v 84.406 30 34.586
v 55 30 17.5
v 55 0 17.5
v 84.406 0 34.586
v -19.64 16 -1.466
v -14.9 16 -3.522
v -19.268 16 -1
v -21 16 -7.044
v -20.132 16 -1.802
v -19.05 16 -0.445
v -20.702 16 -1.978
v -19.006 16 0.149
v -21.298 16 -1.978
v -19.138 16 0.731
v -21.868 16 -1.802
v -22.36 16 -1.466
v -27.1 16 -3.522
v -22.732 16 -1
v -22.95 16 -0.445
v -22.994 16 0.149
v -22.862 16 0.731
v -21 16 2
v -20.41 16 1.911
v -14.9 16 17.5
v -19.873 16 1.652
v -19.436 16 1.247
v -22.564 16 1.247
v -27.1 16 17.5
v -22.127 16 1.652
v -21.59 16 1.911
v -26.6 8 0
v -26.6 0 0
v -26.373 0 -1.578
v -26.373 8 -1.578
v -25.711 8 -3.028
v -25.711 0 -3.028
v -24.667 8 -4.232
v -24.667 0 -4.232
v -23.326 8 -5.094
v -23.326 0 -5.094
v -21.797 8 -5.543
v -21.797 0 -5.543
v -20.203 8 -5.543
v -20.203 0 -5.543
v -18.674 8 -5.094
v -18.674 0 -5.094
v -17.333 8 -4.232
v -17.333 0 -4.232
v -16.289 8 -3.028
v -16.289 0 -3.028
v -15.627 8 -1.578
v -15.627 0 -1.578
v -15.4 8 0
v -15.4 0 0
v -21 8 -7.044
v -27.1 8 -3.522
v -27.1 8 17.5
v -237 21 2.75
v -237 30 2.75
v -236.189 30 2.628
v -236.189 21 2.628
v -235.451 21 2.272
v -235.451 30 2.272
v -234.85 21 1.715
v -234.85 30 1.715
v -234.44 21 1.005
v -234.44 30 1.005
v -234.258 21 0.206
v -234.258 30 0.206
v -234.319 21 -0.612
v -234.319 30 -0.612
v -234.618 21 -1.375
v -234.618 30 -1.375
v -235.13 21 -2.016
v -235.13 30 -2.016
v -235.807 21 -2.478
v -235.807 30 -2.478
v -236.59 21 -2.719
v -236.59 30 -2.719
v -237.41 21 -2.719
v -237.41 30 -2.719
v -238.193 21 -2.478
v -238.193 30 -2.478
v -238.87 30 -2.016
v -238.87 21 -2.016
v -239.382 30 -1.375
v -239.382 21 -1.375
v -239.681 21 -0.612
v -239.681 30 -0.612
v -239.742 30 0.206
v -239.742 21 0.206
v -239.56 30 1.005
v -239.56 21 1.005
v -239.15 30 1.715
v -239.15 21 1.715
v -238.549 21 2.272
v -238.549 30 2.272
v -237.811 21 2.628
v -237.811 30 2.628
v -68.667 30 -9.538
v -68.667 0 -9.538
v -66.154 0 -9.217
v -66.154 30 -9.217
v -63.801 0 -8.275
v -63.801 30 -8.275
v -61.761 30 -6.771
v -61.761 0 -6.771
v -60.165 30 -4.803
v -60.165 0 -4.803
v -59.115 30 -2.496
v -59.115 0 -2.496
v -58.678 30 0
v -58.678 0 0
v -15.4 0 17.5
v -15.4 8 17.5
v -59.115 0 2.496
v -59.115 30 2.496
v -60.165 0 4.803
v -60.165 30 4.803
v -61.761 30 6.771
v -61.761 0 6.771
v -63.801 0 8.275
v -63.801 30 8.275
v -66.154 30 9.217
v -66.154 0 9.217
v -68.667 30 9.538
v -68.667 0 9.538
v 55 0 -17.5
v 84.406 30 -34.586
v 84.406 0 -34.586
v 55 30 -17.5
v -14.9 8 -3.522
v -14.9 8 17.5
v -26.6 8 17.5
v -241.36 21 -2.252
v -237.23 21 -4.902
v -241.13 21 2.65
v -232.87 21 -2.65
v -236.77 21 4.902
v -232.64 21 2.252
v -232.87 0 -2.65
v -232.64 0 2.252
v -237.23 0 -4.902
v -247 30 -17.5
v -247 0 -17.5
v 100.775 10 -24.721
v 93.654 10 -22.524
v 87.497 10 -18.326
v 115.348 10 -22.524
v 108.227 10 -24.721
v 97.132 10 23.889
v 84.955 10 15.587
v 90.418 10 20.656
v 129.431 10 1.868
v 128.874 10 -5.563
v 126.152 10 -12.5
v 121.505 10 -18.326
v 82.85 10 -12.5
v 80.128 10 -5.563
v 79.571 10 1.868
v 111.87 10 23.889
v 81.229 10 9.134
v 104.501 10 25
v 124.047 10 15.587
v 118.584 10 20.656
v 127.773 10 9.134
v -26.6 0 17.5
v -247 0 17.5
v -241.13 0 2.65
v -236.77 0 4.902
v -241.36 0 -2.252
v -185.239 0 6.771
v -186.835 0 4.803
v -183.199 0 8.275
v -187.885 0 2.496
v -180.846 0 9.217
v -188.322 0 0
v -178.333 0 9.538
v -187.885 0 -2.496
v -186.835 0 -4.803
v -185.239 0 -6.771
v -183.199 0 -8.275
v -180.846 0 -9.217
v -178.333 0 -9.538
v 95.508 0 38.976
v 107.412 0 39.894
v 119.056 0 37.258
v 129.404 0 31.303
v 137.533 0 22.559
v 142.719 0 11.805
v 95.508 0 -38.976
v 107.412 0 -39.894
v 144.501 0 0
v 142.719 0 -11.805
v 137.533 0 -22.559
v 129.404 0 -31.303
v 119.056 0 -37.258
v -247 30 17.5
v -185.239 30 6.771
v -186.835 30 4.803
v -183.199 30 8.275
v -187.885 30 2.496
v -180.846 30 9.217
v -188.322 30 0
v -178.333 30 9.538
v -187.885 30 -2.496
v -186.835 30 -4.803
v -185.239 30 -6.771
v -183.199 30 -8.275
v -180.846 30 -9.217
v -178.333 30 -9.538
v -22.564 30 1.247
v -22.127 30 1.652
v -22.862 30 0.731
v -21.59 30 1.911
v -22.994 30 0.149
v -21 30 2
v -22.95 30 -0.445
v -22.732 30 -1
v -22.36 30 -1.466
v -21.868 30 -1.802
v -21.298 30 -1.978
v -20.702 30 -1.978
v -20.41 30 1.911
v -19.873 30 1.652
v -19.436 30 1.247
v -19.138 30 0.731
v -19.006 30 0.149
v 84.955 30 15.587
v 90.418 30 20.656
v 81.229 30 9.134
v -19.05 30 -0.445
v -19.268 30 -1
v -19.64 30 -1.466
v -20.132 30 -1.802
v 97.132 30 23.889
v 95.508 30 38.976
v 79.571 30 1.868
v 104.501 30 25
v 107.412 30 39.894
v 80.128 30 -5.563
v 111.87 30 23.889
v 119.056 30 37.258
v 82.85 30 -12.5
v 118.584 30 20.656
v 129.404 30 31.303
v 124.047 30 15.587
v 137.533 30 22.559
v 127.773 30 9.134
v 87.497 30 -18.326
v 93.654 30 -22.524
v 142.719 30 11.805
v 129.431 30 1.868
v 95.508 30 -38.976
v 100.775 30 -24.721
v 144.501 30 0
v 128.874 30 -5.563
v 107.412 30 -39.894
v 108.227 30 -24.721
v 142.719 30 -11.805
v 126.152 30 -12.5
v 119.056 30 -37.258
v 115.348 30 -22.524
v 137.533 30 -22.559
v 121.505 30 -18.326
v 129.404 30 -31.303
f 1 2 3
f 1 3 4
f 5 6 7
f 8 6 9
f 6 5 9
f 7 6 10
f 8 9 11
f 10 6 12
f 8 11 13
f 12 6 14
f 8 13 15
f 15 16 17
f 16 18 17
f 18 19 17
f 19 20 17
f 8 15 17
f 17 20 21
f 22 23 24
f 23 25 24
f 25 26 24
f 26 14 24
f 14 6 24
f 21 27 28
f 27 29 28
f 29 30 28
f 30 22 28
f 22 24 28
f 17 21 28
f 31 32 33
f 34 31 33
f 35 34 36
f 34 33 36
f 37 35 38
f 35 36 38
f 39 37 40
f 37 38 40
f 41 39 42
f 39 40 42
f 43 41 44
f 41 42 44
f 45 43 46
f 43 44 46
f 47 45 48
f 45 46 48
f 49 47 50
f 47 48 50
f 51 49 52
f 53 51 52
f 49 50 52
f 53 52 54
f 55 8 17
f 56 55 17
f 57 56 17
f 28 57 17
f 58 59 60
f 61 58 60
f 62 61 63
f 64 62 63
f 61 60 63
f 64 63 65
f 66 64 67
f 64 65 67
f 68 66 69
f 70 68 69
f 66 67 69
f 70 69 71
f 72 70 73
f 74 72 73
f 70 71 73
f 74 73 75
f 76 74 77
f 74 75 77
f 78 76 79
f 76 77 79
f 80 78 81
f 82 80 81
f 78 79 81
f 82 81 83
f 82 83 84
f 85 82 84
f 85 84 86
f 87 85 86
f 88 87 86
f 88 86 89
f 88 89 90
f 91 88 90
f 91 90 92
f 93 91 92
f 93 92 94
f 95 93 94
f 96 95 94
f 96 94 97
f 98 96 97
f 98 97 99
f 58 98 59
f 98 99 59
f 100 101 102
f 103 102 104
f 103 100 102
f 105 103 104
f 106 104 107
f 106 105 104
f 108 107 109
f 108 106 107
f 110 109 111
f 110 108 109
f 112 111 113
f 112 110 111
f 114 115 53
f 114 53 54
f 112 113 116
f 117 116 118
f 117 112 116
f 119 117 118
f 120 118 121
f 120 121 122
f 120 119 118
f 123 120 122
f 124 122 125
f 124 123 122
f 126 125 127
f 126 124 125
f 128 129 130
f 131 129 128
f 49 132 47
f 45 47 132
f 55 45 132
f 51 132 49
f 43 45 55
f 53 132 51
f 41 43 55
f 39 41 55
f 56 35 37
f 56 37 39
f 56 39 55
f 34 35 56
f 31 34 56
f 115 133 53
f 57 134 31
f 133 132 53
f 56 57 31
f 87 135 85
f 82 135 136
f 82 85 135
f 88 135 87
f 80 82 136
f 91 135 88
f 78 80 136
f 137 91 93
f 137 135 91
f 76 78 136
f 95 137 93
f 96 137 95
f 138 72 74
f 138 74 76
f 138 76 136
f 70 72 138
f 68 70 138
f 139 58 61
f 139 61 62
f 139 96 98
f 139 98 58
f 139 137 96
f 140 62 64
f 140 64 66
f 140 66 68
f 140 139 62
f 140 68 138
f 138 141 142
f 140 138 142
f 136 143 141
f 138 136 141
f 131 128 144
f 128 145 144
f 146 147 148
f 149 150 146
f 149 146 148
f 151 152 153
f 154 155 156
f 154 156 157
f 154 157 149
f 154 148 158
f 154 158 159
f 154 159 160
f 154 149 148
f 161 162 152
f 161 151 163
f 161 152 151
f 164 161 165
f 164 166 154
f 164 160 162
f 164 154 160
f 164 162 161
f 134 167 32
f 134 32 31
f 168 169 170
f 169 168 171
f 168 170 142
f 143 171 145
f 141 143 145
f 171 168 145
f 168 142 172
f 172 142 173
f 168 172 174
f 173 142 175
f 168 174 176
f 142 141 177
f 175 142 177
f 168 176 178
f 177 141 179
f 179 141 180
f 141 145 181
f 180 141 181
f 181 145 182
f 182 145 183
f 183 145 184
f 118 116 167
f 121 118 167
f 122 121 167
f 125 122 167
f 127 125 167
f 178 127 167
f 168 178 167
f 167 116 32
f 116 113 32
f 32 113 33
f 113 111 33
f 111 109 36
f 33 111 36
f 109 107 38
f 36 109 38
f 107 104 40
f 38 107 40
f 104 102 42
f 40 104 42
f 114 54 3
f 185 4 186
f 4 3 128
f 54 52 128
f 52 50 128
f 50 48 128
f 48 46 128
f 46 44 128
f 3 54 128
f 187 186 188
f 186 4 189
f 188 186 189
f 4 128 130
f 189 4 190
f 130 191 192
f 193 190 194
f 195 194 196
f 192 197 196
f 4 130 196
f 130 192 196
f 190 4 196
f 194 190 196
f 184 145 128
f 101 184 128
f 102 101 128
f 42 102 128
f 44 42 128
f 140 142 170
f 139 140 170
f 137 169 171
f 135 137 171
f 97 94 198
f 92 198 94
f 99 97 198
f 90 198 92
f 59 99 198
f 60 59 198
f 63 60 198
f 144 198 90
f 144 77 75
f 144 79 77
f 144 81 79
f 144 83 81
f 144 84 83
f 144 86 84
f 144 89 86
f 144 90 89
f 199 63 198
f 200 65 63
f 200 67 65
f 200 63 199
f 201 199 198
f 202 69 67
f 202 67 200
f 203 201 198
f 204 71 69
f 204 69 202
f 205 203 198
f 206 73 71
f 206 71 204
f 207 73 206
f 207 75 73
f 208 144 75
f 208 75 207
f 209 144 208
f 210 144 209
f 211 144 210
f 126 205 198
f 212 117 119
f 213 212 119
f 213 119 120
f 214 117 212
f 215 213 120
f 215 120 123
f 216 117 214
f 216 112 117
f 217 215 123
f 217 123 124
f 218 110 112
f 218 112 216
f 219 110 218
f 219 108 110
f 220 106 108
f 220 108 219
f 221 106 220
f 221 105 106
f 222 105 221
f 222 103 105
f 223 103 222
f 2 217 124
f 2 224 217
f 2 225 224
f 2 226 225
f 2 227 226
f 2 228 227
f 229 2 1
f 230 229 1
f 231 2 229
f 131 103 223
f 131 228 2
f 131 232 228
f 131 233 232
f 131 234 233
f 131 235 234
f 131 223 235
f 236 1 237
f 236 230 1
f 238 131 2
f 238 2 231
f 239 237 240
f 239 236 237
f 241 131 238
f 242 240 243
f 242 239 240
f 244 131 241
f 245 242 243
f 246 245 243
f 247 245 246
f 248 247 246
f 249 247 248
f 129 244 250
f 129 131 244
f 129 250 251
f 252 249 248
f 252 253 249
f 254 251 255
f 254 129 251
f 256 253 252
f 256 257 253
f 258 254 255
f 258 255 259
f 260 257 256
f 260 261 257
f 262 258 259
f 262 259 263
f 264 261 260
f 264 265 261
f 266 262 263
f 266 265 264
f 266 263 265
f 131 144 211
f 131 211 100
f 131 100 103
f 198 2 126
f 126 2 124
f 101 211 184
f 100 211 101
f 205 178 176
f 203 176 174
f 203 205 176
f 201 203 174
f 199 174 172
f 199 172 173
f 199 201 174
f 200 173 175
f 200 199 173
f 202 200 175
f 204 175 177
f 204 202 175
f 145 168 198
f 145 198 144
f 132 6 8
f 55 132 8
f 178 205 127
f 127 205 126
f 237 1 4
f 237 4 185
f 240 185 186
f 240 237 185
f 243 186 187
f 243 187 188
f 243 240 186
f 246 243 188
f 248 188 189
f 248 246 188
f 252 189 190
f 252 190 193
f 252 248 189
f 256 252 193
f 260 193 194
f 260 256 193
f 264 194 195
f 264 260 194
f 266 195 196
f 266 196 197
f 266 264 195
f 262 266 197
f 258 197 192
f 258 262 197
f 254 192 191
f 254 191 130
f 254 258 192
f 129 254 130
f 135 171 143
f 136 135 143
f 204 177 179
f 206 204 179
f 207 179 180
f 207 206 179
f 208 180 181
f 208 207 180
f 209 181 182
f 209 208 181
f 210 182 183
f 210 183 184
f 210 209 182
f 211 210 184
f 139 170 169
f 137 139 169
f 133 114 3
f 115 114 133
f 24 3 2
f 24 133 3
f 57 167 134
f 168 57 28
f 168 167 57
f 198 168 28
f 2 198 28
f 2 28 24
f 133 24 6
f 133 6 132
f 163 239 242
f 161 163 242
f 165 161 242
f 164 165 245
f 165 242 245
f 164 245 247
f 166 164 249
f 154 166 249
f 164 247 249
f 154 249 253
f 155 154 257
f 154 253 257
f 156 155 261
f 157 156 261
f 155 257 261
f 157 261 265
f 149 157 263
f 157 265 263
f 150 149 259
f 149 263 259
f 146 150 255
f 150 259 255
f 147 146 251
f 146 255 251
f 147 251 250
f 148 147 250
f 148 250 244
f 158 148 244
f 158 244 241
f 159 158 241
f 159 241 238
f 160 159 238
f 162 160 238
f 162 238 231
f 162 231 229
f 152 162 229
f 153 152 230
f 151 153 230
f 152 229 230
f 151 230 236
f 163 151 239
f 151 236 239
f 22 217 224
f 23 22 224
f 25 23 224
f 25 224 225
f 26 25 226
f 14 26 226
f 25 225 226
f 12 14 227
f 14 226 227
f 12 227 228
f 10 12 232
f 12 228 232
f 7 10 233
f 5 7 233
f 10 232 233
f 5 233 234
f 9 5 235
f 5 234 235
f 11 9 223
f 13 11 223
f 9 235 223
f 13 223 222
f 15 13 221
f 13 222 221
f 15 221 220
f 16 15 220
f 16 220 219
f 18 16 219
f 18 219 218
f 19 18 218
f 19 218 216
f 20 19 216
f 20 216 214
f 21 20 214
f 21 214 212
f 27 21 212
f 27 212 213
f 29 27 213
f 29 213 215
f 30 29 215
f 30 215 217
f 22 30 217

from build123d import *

# Parameters (mm, degrees)
SKETCH2_W           = 247
SKETCH2_H           = 35
BOSS_EXTRUDE1_DEPTH = 30
SKETCH3_R           = 5.6
CUT_EXTRUDE1_DEPTH  = 250.429849858
CUT_EXTRUDE2_DEPTH  = 22
SKETCH6_W           = 22.496439662
SKETCH6_H           = 14
BOSS_EXTRUDE3_DEPTH = 38
CUT_EXTRUDE4_DEPTH  = 17.5
SKETCH9_R           = 2
CUT_EXTRUDE5_DEPTH  = 38
SKETCH15_R          = 2.75
CUT_EXTRUDE10_DEPTH = 9
CUT_EXTRUDE11_DEPTH = 21
SKETCH17_W          = 129.66543269
SKETCH17_H          = 19.076880406
CUT_EXTRUDE12_DEPTH = 250.429849858
FILLET1_R           = 10
SKETCH19_W          = 35
SKETCH19_H          = 30
BOSS_EXTRUDE5_DEPTH = 55
BOSS_EXTRUDE4_DEPTH = 30
SKETCH21_R          = 25
CUT_EXTRUDE14_DEPTH = 20


with BuildPart() as part:
    # Sketch2 → Boss-Extrude1 (new body)
    with BuildSketch(Plane(origin=(0, 0, 0), x_dir=(1, 0, 0), z_dir=(0, 1, 0))):
        with Locations((-123.5, 0)):
            Rectangle(SKETCH2_W, SKETCH2_H)
    extrude(amount=BOSS_EXTRUDE1_DEPTH)

    # Sketch3 → Cut-Extrude1 (cut, through all)
    with BuildSketch(Plane.XZ):
        with Locations(Location((-21, 0, 0), (0, 0, 270))):
            Circle(SKETCH3_R)
    extrude(amount=-CUT_EXTRUDE1_DEPTH, mode=Mode.SUBTRACT)

    # Sketch4 → Cut-Extrude2 (cut)
    with BuildSketch(Plane(origin=(0, 30, 0), x_dir=(1, 0, 0), z_dir=(0, 1, 0))):
        Polygon((-14.9, 3.521836642), (-21, 7.043673284), (-27.1, 3.521836642), (-27.1, -3.521836642), (-21, -7.043673284), (-14.9, -3.521836642), align=None)
    extrude(amount=-CUT_EXTRUDE2_DEPTH, mode=Mode.SUBTRACT)

    # Sketch6 → Boss-Extrude3 (add)
    with BuildSketch(Plane(origin=(0, 0, 0), x_dir=(0, 0, -1), z_dir=(1, 0, 0))):
        with Locations((0.204742288, 23)):
            Rectangle(SKETCH6_W, SKETCH6_H)
    extrude(amount=-BOSS_EXTRUDE3_DEPTH)

    # Sketch7 → Cut-Extrude4 (cut)
    with BuildSketch(Plane.XY.offset(17.5)):
        Polygon((-21, 16), (-14.9, 16), (-14.9, 8), (-15.4, 8), (-15.4, 0), (-26.6, 0), (-26.6, 8), (-27.1, 8), (-27.1, 16), align=None)
    extrude(amount=-CUT_EXTRUDE4_DEPTH, mode=Mode.SUBTRACT)

    # Sketch9 → Cut-Extrude5 (cut)
    with BuildSketch(Plane(origin=(0, 30, 0), x_dir=(1, 0, 0), z_dir=(0, 1, 0))):
        with Locations(Location((-21, 0, 0), (0, 0, 270))):
            Circle(SKETCH9_R)
    extrude(amount=-CUT_EXTRUDE5_DEPTH, mode=Mode.SUBTRACT)

    # Sketch15 → Cut-Extrude10 (cut)
    with BuildSketch(Plane(origin=(0, 30, 0), x_dir=(1, 0, 0), z_dir=(0, 1, 0))):
        with Locations(Location((-237, 0, 0), (0, 0, 270))):
            Circle(SKETCH15_R)
    extrude(amount=-CUT_EXTRUDE10_DEPTH, mode=Mode.SUBTRACT)

    # Sketch16 → Cut-Extrude11 (cut)
    with BuildSketch(Plane.XZ):
        Polygon((-241.130206964, 2.650419546), (-241.36043414, -2.25165438), (-237.230227176, -4.902073926), (-232.869793036, -2.650419546), (-232.63956586, 2.25165438), (-236.769772824, 4.902073926), align=None)
    extrude(amount=-CUT_EXTRUDE11_DEPTH, mode=Mode.SUBTRACT)

    # Sketch17 → Cut-Extrude12 (cut, through all)
    with BuildSketch(Plane(origin=(0, 30, 0), x_dir=(1, 0, 0), z_dir=(0, 1, 0))):
        with Locations((-123.5, 0)):
            Rectangle(SKETCH17_W, SKETCH17_H)
    extrude(amount=-CUT_EXTRUDE12_DEPTH, mode=Mode.SUBTRACT)

    # Fillet1
    # the kernel refuses this fillet: 10 mm, written as the material it adds along each edge
    with BuildSketch(Plane(origin=(-58.667283655, 30, 9.538440203), x_dir=(0, 0, -1), z_dir=(0, -1, 0))) as fillet1_piece_1:
        with BuildLine():
            CenterArc((FILLET1_R, -FILLET1_R), FILLET1_R, 90, 90)
            Line((0, -FILLET1_R), (0, 0))
            Line((0, 0), (FILLET1_R, 0))
        make_face()
    extrude(amount=30)
    with BuildSketch(Plane(origin=(-58.667283655, 30, -9.538440203), x_dir=(0, 0, 1), z_dir=(0, -1, 0)), Plane(origin=(-188.332716345, 30, -9.538440203), x_dir=(1, 0, 0), z_dir=(0, -1, 0)), Plane(origin=(-188.332716345, 30, 9.538440203), x_dir=(0, 0, -1), z_dir=(0, -1, 0))) as fillet1_piece_2:
        with BuildLine():
            CenterArc((FILLET1_R, FILLET1_R), FILLET1_R, 180, 90)
            Line((0, FILLET1_R), (0, 0))
            Line((0, 0), (FILLET1_R, 0))
        make_face()
    extrude(amount=30)

    # Sketch19 → Boss-Extrude5 (add)
    with BuildSketch(Plane(origin=(0, 0, 0), x_dir=(0, 0, -1), z_dir=(1, 0, 0))):
        with Locations((0, 15)):
            Rectangle(SKETCH19_W, SKETCH19_H)
    extrude(amount=BOSS_EXTRUDE5_DEPTH)

    # Sketch18 → Boss-Extrude4 (add)
    with BuildSketch(Plane(origin=(0, 30, 0), x_dir=(1, 0, 0), z_dir=(0, 1, 0))):
        with BuildLine():
            Line((55, 17.5), (55, -17.5))
            Line((55, -17.5), (84.405509337, -34.58567742))
            ThreePointArc((84.405509337, -34.58567742), (144.501054052, 0), (84.405509337, 34.58567742))
            Line((84.405509337, 34.58567742), (55, 17.5))
        make_face()
    extrude(amount=-BOSS_EXTRUDE4_DEPTH)

    # Sketch21 → Cut-Extrude14 (cut)
    with BuildSketch(Plane(origin=(0, 30, 0), x_dir=(1, 0, 0), z_dir=(0, 1, 0))):
        with Locations(Location((104.501054052, 0, 0), (0, 0, 270))):
            Circle(SKETCH21_R)
    extrude(amount=-CUT_EXTRUDE14_DEPTH, mode=Mode.SUBTRACT)


solid = part.part
